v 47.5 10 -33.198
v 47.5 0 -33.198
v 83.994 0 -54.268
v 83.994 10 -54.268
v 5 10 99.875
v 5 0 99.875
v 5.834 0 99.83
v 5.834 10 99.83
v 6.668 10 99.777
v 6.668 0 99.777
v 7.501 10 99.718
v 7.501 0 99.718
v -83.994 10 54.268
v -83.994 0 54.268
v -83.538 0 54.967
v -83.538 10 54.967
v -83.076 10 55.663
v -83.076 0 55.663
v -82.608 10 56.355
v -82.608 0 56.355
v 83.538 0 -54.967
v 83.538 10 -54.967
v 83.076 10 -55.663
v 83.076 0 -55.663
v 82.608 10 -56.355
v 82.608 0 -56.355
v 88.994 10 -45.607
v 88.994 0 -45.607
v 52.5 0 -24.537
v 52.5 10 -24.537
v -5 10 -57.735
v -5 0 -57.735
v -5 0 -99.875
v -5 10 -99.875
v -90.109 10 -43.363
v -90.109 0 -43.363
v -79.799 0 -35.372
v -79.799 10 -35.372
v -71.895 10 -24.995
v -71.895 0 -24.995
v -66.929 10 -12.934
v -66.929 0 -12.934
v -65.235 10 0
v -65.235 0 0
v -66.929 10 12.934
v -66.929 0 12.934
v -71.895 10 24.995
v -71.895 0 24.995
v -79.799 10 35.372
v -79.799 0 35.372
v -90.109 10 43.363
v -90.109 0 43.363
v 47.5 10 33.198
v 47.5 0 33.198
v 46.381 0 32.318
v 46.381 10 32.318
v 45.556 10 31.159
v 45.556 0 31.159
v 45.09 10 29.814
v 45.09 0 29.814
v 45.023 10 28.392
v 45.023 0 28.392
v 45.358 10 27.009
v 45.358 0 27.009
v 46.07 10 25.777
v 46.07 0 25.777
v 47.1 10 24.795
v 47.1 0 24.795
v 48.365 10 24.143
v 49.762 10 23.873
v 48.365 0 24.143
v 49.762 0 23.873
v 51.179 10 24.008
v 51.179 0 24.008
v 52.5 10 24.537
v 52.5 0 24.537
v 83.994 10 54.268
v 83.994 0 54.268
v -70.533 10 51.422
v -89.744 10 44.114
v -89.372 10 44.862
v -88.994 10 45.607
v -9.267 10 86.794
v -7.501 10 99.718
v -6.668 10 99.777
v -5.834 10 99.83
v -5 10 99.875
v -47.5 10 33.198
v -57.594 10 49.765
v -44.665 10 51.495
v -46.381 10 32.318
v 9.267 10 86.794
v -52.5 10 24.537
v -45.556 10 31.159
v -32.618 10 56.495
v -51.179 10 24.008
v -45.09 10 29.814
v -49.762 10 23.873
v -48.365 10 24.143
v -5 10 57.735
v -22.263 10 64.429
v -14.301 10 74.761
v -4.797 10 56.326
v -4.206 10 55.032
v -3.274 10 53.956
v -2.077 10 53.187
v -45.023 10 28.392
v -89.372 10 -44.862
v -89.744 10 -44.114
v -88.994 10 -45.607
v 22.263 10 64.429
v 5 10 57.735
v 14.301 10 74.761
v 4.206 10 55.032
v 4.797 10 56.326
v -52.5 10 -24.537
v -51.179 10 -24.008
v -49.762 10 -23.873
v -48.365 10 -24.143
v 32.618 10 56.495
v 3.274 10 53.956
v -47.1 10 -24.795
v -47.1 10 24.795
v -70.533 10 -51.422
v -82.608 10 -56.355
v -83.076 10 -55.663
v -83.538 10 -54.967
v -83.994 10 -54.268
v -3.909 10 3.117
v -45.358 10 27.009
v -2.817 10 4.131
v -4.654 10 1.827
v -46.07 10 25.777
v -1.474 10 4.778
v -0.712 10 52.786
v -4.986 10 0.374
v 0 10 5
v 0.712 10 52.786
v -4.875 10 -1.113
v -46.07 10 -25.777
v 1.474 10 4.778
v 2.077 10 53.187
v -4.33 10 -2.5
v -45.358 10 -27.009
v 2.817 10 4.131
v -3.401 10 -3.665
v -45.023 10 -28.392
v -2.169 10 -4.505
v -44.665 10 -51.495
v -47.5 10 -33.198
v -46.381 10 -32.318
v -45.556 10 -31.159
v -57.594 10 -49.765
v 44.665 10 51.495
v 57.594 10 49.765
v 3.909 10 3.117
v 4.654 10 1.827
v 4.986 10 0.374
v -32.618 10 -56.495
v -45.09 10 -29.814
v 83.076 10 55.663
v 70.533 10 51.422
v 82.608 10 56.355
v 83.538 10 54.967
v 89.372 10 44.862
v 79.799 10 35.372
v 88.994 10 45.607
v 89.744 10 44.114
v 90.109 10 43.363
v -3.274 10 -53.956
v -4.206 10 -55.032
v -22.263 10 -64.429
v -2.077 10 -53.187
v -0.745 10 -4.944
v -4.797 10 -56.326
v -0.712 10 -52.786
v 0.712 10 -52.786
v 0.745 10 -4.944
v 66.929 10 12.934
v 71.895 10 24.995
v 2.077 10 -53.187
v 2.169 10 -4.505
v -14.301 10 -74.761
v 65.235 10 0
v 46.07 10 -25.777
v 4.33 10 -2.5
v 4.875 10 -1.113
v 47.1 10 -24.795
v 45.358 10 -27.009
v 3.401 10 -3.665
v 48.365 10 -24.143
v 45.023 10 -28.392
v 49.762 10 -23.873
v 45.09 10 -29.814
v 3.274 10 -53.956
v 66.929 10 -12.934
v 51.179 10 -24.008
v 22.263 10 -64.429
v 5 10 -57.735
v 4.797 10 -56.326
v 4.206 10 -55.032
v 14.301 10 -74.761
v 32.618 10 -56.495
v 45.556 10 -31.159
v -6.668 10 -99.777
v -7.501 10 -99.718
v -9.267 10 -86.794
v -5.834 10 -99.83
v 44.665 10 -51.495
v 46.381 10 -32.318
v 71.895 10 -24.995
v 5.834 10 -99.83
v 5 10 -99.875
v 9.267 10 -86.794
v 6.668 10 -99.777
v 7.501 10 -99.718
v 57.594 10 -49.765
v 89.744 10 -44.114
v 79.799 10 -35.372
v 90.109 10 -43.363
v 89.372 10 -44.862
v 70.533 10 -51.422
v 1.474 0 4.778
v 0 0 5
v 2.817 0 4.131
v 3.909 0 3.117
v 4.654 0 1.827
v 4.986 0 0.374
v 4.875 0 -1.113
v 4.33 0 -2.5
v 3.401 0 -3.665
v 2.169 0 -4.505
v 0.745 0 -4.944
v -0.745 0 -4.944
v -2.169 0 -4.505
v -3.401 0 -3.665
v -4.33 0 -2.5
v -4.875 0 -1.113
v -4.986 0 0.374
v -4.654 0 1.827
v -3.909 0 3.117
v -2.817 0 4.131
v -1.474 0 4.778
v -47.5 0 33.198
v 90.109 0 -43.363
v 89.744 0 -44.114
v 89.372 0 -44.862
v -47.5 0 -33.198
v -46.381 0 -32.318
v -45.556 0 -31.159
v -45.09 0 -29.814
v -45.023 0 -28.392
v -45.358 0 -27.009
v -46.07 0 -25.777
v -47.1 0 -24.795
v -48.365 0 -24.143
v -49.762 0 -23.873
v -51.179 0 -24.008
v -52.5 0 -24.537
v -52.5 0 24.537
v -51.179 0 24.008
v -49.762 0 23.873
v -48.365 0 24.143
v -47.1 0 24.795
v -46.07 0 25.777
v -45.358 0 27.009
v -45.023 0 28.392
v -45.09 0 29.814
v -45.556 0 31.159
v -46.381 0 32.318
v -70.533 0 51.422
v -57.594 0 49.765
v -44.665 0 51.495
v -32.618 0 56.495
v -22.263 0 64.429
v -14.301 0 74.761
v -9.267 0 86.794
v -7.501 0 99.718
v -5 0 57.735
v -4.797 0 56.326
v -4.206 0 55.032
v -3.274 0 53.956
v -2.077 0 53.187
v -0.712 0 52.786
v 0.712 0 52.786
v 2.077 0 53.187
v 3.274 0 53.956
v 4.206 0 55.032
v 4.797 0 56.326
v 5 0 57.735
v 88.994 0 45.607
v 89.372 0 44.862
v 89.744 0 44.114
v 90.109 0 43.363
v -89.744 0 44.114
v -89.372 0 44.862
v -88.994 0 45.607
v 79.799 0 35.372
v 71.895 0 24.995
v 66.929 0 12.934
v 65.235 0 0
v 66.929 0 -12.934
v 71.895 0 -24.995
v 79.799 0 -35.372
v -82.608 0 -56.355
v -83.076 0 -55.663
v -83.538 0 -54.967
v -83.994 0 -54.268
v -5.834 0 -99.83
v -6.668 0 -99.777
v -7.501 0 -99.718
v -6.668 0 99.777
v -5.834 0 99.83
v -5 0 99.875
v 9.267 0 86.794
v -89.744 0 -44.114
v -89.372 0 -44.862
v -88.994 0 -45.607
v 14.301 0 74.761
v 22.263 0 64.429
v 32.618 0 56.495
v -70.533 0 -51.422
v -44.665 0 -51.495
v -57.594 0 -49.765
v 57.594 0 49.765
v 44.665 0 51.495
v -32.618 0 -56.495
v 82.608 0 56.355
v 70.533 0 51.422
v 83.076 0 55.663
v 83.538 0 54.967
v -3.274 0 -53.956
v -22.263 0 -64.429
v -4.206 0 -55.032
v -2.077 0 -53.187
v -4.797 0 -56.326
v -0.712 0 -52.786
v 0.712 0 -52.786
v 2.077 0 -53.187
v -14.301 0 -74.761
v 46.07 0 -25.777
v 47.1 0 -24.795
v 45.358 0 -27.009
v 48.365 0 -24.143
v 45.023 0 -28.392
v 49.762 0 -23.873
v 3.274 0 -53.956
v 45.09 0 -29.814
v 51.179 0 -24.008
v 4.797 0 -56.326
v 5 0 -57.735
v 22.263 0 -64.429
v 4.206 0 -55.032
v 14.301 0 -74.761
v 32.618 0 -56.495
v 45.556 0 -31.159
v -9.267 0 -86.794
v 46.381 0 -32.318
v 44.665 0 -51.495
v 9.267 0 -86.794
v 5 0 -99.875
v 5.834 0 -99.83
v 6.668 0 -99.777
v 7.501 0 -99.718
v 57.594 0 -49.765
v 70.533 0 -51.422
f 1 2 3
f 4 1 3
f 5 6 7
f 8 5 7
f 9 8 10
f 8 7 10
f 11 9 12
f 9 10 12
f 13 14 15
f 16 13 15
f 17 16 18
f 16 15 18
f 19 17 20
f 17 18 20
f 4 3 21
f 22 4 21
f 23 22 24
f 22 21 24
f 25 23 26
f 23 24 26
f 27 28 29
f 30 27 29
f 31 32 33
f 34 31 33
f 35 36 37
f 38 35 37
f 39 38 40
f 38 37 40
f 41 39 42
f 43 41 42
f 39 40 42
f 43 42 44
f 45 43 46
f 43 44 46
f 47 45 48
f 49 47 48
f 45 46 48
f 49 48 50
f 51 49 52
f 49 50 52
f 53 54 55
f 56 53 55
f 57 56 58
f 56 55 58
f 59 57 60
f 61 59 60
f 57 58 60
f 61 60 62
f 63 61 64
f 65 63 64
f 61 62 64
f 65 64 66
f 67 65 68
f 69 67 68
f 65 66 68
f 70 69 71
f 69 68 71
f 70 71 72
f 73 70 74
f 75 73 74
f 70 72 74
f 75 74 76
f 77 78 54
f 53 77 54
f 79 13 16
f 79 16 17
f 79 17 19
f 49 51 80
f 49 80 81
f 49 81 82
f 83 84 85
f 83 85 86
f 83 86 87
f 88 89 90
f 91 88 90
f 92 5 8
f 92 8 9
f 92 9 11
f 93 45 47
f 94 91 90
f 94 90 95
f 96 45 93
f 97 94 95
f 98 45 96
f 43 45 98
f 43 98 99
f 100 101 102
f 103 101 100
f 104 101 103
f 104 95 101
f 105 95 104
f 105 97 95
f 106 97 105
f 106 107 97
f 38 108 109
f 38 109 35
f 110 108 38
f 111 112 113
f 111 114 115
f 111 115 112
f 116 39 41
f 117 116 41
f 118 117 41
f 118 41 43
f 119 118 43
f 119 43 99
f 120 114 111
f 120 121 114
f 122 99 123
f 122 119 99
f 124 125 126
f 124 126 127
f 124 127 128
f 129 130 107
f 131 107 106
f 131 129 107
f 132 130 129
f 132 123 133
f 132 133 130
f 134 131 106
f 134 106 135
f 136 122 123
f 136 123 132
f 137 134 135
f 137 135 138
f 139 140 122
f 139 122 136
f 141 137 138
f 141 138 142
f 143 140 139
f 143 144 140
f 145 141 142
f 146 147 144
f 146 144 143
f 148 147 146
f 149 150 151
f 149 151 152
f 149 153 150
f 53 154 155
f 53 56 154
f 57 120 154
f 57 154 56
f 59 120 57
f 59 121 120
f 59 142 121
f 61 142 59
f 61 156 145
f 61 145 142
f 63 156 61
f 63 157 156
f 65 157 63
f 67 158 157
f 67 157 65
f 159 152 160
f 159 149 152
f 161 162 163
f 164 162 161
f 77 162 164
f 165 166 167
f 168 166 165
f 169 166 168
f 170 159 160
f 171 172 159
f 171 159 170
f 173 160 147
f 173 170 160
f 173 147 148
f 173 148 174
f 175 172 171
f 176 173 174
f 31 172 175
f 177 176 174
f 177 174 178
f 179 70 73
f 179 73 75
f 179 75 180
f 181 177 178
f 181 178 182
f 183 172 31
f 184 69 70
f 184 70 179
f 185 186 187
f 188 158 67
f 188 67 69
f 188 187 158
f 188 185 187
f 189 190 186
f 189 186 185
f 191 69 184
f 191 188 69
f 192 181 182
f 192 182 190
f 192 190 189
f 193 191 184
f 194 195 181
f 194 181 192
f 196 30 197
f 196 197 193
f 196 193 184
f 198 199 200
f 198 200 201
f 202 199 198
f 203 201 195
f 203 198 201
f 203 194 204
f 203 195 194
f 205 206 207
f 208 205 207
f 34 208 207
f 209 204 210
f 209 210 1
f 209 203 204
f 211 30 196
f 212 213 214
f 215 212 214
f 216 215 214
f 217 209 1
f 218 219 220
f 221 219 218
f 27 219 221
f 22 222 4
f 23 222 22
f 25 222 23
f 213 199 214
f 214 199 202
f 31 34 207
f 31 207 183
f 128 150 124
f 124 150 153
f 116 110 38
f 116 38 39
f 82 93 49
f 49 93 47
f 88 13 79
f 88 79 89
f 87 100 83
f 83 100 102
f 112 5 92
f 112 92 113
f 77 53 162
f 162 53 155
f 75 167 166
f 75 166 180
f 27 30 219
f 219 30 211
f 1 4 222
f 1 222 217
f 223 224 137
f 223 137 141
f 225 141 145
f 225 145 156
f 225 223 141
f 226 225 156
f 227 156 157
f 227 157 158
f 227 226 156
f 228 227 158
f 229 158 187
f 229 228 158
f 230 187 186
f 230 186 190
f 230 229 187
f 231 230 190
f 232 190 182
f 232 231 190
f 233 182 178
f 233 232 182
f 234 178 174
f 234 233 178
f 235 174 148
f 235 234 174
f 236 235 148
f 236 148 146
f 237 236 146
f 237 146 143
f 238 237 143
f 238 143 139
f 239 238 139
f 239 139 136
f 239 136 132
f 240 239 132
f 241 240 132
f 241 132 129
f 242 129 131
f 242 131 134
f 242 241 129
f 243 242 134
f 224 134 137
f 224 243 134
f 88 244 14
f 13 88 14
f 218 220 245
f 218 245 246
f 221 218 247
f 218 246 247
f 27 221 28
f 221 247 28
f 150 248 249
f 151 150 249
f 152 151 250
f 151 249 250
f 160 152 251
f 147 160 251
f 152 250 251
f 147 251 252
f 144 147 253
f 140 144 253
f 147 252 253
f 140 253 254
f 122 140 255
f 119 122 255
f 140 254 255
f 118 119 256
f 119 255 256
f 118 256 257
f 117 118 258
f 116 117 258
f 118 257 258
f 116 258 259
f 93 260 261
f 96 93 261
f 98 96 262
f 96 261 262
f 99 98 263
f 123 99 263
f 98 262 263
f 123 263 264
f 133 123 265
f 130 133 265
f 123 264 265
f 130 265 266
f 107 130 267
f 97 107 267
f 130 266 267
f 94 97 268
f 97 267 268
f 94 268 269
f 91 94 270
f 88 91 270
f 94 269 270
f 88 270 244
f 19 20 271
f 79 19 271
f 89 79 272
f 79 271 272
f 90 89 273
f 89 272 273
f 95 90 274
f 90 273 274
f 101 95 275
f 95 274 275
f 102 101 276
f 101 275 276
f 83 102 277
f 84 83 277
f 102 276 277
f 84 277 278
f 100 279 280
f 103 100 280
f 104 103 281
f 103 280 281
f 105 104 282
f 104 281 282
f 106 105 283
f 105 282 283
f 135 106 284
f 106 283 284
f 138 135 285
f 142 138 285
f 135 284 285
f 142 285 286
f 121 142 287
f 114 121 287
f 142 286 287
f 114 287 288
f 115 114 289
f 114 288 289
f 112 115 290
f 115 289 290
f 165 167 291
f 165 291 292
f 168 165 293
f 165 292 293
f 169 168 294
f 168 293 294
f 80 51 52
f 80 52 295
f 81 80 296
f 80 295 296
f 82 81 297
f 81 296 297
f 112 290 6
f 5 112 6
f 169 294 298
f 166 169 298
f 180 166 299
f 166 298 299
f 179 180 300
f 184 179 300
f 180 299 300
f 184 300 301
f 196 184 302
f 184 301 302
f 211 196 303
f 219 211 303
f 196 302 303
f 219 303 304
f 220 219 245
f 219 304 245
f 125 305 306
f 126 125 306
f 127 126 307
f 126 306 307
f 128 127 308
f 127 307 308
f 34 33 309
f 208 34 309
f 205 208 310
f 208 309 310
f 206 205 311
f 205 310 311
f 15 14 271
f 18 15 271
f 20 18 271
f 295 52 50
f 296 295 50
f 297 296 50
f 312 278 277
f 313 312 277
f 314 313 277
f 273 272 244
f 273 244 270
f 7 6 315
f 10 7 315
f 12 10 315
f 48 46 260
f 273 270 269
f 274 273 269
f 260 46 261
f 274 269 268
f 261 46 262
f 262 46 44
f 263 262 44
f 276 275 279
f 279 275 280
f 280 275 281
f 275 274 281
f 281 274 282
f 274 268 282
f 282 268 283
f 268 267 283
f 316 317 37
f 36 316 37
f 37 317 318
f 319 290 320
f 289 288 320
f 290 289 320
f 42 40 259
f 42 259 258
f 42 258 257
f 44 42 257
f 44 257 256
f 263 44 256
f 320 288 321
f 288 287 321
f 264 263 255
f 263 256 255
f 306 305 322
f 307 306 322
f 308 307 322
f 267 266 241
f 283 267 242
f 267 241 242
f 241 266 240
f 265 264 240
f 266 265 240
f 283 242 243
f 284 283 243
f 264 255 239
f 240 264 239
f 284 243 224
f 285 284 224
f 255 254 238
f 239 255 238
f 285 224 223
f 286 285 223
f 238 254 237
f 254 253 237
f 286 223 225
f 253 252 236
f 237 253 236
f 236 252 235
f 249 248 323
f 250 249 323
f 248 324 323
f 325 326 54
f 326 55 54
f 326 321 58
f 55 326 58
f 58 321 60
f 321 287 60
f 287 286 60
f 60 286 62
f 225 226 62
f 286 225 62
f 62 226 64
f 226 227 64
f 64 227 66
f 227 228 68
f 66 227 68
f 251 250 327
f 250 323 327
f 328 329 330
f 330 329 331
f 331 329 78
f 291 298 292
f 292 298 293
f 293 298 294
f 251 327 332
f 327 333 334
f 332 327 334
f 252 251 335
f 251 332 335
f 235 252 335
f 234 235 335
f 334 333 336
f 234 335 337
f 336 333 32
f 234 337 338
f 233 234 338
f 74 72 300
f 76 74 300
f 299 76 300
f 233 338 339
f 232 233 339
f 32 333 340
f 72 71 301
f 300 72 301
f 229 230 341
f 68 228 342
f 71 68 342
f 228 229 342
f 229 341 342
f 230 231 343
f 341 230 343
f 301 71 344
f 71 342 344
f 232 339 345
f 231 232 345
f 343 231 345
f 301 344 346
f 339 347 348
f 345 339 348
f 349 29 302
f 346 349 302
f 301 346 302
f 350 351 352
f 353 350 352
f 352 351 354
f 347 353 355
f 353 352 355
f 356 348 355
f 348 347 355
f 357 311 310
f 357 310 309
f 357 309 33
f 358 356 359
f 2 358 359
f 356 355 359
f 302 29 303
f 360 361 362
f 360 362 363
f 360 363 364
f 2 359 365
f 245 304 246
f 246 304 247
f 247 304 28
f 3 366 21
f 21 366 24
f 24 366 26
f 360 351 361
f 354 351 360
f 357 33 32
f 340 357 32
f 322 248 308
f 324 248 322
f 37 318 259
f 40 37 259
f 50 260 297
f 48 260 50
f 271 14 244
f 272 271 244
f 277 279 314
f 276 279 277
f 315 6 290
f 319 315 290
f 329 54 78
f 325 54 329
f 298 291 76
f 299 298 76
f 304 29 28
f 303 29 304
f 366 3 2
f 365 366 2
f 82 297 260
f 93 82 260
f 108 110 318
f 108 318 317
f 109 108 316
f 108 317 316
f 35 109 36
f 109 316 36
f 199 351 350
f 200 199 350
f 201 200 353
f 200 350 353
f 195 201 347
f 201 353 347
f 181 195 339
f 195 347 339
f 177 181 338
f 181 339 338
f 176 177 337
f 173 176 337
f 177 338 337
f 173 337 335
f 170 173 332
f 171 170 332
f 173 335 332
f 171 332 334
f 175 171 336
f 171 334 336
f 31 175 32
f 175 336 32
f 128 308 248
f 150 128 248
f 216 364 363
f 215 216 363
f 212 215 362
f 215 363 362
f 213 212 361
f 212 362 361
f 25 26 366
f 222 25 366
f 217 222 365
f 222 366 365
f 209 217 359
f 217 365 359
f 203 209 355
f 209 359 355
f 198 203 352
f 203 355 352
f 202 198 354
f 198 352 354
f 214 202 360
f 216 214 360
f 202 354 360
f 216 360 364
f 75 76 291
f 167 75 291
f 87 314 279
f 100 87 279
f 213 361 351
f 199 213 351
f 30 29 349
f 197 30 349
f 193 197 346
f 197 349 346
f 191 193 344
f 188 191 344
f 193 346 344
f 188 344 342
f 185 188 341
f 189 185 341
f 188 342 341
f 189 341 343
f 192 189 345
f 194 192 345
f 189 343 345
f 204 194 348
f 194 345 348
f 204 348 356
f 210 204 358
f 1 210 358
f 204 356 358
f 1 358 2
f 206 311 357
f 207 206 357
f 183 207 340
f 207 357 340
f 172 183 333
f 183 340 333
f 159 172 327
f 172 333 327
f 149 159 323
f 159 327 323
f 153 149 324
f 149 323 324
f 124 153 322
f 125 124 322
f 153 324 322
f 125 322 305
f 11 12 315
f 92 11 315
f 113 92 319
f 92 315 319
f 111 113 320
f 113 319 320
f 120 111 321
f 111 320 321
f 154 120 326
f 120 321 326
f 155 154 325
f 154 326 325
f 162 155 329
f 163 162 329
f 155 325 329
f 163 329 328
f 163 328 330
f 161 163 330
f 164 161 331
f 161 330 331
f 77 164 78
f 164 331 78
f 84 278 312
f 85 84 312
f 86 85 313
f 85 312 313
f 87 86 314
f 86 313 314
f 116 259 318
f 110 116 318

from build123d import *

# Parameters (mm, degrees)
SKETCH1_R           = 5
BOSS_EXTRUDE1_DEPTH = 10


with BuildPart() as part:
    # Sketch1 → Boss-Extrude1 (new body)
    with BuildSketch(Plane(origin=(0, 0, 0), x_dir=(1, 0, 0), z_dir=(0, 1, 0))):
        with BuildLine():
            ThreePointArc((7.500789876, 99.718293965), (6.250885533, 99.804440934), (5, 99.874921777))
            Line((5, 99.874921777), (5, 57.735026919))
            ThreePointArc((5, 57.735026919), (0, 52.735026919), (-5, 57.735026919))
            Line((-5, 57.735026919), (-5, 99.874921777))
            ThreePointArc((-5, 99.874921777), (-6.250885533, 99.804440934), (-7.500789876, 99.718293965))
            ThreePointArc((-7.500789876, 99.718293965), (-32.617513459, 56.495190528), (-82.608180857, 56.355021564))
            ThreePointArc((-82.608180857, 56.355021564), (-83.307738492, 55.315646135), (-83.99421946, 54.267587908))
            Line((-83.99421946, 54.267587908), (-47.5, 33.197640478))
            ThreePointArc((-47.5, 33.197640478), (-45.669872981, 26.367513459), (-52.5, 24.537386441))
            Line((-52.5, 24.537386441), (-88.99421946, 45.60733387))
            ThreePointArc((-88.99421946, 45.60733387), (-89.558624026, 44.488794799), (-90.108970734, 43.363272401))
            ThreePointArc((-90.108970734, 43.363272401), (-65.235026919, 0), (-90.108970734, -43.363272401))
            ThreePointArc((-90.108970734, -43.363272401), (-89.558624026, -44.488794799), (-88.99421946, -45.60733387))
            Line((-88.99421946, -45.60733387), (-52.5, -24.537386441))
            ThreePointArc((-52.5, -24.537386441), (-45.669872981, -26.367513459), (-47.5, -33.197640478))
            Line((-47.5, -33.197640478), (-83.99421946, -54.267587908))
            ThreePointArc((-83.99421946, -54.267587908), (-83.307738492, -55.315646135), (-82.608180857, -56.355021564))
            ThreePointArc((-82.608180857, -56.355021564), (-32.617513459, -56.495190528), (-7.500789876, -99.718293965))
            ThreePointArc((-7.500789876, -99.718293965), (-6.250885533, -99.804440934), (-5, -99.874921777))
            Line((-5, -99.874921777), (-5, -57.735026919))
            ThreePointArc((-5, -57.735026919), (0, -52.735026919), (5, -57.735026919))
            Line((5, -57.735026919), (5, -99.874921777))
            ThreePointArc((5, -99.874921777), (6.250885533, -99.804440934), (7.500789876, -99.718293965))
            ThreePointArc((7.500789876, -99.718293965), (32.617513459, -56.495190528), (82.608180857, -56.355021564))
            ThreePointArc((82.608180857, -56.355021564), (83.307738492, -55.315646135), (83.99421946, -54.267587908))
            Line((83.99421946, -54.267587908), (47.5, -33.197640478))
            ThreePointArc((47.5, -33.197640478), (45.669872981, -26.367513459), (52.5, -24.537386441))
            Line((52.5, -24.537386441), (88.99421946, -45.60733387))
            ThreePointArc((88.99421946, -45.60733387), (89.558624026, -44.488794799), (90.108970734, -43.363272401))
            ThreePointArc((90.108970734, -43.363272401), (65.235026919, 0), (90.108970734, 43.363272401))
            ThreePointArc((90.108970734, 43.363272401), (89.558624026, 44.488794799), (88.99421946, 45.60733387))
            Line((88.99421946, 45.60733387), (52.5, 24.537386441))
            ThreePointArc((52.5, 24.537386441), (45.669872981, 26.367513459), (47.5, 33.197640478))
            Line((47.5, 33.197640478), (83.99421946, 54.267587908))
            ThreePointArc((83.99421946, 54.267587908), (83.307738492, 55.315646135), (82.608180857, 56.355021564))
            ThreePointArc((82.608180857, 56.355021564), (32.617513459, 56.495190528), (7.500789876, 99.718293965))
        make_face()
        with Locations(Location((0, 0, 0), (0, 0, 270))):  # turned: the seam where the file's is
            Circle(SKETCH1_R, mode=Mode.SUBTRACT)
    extrude(amount=BOSS_EXTRUDE1_DEPTH)


solid = part.part
